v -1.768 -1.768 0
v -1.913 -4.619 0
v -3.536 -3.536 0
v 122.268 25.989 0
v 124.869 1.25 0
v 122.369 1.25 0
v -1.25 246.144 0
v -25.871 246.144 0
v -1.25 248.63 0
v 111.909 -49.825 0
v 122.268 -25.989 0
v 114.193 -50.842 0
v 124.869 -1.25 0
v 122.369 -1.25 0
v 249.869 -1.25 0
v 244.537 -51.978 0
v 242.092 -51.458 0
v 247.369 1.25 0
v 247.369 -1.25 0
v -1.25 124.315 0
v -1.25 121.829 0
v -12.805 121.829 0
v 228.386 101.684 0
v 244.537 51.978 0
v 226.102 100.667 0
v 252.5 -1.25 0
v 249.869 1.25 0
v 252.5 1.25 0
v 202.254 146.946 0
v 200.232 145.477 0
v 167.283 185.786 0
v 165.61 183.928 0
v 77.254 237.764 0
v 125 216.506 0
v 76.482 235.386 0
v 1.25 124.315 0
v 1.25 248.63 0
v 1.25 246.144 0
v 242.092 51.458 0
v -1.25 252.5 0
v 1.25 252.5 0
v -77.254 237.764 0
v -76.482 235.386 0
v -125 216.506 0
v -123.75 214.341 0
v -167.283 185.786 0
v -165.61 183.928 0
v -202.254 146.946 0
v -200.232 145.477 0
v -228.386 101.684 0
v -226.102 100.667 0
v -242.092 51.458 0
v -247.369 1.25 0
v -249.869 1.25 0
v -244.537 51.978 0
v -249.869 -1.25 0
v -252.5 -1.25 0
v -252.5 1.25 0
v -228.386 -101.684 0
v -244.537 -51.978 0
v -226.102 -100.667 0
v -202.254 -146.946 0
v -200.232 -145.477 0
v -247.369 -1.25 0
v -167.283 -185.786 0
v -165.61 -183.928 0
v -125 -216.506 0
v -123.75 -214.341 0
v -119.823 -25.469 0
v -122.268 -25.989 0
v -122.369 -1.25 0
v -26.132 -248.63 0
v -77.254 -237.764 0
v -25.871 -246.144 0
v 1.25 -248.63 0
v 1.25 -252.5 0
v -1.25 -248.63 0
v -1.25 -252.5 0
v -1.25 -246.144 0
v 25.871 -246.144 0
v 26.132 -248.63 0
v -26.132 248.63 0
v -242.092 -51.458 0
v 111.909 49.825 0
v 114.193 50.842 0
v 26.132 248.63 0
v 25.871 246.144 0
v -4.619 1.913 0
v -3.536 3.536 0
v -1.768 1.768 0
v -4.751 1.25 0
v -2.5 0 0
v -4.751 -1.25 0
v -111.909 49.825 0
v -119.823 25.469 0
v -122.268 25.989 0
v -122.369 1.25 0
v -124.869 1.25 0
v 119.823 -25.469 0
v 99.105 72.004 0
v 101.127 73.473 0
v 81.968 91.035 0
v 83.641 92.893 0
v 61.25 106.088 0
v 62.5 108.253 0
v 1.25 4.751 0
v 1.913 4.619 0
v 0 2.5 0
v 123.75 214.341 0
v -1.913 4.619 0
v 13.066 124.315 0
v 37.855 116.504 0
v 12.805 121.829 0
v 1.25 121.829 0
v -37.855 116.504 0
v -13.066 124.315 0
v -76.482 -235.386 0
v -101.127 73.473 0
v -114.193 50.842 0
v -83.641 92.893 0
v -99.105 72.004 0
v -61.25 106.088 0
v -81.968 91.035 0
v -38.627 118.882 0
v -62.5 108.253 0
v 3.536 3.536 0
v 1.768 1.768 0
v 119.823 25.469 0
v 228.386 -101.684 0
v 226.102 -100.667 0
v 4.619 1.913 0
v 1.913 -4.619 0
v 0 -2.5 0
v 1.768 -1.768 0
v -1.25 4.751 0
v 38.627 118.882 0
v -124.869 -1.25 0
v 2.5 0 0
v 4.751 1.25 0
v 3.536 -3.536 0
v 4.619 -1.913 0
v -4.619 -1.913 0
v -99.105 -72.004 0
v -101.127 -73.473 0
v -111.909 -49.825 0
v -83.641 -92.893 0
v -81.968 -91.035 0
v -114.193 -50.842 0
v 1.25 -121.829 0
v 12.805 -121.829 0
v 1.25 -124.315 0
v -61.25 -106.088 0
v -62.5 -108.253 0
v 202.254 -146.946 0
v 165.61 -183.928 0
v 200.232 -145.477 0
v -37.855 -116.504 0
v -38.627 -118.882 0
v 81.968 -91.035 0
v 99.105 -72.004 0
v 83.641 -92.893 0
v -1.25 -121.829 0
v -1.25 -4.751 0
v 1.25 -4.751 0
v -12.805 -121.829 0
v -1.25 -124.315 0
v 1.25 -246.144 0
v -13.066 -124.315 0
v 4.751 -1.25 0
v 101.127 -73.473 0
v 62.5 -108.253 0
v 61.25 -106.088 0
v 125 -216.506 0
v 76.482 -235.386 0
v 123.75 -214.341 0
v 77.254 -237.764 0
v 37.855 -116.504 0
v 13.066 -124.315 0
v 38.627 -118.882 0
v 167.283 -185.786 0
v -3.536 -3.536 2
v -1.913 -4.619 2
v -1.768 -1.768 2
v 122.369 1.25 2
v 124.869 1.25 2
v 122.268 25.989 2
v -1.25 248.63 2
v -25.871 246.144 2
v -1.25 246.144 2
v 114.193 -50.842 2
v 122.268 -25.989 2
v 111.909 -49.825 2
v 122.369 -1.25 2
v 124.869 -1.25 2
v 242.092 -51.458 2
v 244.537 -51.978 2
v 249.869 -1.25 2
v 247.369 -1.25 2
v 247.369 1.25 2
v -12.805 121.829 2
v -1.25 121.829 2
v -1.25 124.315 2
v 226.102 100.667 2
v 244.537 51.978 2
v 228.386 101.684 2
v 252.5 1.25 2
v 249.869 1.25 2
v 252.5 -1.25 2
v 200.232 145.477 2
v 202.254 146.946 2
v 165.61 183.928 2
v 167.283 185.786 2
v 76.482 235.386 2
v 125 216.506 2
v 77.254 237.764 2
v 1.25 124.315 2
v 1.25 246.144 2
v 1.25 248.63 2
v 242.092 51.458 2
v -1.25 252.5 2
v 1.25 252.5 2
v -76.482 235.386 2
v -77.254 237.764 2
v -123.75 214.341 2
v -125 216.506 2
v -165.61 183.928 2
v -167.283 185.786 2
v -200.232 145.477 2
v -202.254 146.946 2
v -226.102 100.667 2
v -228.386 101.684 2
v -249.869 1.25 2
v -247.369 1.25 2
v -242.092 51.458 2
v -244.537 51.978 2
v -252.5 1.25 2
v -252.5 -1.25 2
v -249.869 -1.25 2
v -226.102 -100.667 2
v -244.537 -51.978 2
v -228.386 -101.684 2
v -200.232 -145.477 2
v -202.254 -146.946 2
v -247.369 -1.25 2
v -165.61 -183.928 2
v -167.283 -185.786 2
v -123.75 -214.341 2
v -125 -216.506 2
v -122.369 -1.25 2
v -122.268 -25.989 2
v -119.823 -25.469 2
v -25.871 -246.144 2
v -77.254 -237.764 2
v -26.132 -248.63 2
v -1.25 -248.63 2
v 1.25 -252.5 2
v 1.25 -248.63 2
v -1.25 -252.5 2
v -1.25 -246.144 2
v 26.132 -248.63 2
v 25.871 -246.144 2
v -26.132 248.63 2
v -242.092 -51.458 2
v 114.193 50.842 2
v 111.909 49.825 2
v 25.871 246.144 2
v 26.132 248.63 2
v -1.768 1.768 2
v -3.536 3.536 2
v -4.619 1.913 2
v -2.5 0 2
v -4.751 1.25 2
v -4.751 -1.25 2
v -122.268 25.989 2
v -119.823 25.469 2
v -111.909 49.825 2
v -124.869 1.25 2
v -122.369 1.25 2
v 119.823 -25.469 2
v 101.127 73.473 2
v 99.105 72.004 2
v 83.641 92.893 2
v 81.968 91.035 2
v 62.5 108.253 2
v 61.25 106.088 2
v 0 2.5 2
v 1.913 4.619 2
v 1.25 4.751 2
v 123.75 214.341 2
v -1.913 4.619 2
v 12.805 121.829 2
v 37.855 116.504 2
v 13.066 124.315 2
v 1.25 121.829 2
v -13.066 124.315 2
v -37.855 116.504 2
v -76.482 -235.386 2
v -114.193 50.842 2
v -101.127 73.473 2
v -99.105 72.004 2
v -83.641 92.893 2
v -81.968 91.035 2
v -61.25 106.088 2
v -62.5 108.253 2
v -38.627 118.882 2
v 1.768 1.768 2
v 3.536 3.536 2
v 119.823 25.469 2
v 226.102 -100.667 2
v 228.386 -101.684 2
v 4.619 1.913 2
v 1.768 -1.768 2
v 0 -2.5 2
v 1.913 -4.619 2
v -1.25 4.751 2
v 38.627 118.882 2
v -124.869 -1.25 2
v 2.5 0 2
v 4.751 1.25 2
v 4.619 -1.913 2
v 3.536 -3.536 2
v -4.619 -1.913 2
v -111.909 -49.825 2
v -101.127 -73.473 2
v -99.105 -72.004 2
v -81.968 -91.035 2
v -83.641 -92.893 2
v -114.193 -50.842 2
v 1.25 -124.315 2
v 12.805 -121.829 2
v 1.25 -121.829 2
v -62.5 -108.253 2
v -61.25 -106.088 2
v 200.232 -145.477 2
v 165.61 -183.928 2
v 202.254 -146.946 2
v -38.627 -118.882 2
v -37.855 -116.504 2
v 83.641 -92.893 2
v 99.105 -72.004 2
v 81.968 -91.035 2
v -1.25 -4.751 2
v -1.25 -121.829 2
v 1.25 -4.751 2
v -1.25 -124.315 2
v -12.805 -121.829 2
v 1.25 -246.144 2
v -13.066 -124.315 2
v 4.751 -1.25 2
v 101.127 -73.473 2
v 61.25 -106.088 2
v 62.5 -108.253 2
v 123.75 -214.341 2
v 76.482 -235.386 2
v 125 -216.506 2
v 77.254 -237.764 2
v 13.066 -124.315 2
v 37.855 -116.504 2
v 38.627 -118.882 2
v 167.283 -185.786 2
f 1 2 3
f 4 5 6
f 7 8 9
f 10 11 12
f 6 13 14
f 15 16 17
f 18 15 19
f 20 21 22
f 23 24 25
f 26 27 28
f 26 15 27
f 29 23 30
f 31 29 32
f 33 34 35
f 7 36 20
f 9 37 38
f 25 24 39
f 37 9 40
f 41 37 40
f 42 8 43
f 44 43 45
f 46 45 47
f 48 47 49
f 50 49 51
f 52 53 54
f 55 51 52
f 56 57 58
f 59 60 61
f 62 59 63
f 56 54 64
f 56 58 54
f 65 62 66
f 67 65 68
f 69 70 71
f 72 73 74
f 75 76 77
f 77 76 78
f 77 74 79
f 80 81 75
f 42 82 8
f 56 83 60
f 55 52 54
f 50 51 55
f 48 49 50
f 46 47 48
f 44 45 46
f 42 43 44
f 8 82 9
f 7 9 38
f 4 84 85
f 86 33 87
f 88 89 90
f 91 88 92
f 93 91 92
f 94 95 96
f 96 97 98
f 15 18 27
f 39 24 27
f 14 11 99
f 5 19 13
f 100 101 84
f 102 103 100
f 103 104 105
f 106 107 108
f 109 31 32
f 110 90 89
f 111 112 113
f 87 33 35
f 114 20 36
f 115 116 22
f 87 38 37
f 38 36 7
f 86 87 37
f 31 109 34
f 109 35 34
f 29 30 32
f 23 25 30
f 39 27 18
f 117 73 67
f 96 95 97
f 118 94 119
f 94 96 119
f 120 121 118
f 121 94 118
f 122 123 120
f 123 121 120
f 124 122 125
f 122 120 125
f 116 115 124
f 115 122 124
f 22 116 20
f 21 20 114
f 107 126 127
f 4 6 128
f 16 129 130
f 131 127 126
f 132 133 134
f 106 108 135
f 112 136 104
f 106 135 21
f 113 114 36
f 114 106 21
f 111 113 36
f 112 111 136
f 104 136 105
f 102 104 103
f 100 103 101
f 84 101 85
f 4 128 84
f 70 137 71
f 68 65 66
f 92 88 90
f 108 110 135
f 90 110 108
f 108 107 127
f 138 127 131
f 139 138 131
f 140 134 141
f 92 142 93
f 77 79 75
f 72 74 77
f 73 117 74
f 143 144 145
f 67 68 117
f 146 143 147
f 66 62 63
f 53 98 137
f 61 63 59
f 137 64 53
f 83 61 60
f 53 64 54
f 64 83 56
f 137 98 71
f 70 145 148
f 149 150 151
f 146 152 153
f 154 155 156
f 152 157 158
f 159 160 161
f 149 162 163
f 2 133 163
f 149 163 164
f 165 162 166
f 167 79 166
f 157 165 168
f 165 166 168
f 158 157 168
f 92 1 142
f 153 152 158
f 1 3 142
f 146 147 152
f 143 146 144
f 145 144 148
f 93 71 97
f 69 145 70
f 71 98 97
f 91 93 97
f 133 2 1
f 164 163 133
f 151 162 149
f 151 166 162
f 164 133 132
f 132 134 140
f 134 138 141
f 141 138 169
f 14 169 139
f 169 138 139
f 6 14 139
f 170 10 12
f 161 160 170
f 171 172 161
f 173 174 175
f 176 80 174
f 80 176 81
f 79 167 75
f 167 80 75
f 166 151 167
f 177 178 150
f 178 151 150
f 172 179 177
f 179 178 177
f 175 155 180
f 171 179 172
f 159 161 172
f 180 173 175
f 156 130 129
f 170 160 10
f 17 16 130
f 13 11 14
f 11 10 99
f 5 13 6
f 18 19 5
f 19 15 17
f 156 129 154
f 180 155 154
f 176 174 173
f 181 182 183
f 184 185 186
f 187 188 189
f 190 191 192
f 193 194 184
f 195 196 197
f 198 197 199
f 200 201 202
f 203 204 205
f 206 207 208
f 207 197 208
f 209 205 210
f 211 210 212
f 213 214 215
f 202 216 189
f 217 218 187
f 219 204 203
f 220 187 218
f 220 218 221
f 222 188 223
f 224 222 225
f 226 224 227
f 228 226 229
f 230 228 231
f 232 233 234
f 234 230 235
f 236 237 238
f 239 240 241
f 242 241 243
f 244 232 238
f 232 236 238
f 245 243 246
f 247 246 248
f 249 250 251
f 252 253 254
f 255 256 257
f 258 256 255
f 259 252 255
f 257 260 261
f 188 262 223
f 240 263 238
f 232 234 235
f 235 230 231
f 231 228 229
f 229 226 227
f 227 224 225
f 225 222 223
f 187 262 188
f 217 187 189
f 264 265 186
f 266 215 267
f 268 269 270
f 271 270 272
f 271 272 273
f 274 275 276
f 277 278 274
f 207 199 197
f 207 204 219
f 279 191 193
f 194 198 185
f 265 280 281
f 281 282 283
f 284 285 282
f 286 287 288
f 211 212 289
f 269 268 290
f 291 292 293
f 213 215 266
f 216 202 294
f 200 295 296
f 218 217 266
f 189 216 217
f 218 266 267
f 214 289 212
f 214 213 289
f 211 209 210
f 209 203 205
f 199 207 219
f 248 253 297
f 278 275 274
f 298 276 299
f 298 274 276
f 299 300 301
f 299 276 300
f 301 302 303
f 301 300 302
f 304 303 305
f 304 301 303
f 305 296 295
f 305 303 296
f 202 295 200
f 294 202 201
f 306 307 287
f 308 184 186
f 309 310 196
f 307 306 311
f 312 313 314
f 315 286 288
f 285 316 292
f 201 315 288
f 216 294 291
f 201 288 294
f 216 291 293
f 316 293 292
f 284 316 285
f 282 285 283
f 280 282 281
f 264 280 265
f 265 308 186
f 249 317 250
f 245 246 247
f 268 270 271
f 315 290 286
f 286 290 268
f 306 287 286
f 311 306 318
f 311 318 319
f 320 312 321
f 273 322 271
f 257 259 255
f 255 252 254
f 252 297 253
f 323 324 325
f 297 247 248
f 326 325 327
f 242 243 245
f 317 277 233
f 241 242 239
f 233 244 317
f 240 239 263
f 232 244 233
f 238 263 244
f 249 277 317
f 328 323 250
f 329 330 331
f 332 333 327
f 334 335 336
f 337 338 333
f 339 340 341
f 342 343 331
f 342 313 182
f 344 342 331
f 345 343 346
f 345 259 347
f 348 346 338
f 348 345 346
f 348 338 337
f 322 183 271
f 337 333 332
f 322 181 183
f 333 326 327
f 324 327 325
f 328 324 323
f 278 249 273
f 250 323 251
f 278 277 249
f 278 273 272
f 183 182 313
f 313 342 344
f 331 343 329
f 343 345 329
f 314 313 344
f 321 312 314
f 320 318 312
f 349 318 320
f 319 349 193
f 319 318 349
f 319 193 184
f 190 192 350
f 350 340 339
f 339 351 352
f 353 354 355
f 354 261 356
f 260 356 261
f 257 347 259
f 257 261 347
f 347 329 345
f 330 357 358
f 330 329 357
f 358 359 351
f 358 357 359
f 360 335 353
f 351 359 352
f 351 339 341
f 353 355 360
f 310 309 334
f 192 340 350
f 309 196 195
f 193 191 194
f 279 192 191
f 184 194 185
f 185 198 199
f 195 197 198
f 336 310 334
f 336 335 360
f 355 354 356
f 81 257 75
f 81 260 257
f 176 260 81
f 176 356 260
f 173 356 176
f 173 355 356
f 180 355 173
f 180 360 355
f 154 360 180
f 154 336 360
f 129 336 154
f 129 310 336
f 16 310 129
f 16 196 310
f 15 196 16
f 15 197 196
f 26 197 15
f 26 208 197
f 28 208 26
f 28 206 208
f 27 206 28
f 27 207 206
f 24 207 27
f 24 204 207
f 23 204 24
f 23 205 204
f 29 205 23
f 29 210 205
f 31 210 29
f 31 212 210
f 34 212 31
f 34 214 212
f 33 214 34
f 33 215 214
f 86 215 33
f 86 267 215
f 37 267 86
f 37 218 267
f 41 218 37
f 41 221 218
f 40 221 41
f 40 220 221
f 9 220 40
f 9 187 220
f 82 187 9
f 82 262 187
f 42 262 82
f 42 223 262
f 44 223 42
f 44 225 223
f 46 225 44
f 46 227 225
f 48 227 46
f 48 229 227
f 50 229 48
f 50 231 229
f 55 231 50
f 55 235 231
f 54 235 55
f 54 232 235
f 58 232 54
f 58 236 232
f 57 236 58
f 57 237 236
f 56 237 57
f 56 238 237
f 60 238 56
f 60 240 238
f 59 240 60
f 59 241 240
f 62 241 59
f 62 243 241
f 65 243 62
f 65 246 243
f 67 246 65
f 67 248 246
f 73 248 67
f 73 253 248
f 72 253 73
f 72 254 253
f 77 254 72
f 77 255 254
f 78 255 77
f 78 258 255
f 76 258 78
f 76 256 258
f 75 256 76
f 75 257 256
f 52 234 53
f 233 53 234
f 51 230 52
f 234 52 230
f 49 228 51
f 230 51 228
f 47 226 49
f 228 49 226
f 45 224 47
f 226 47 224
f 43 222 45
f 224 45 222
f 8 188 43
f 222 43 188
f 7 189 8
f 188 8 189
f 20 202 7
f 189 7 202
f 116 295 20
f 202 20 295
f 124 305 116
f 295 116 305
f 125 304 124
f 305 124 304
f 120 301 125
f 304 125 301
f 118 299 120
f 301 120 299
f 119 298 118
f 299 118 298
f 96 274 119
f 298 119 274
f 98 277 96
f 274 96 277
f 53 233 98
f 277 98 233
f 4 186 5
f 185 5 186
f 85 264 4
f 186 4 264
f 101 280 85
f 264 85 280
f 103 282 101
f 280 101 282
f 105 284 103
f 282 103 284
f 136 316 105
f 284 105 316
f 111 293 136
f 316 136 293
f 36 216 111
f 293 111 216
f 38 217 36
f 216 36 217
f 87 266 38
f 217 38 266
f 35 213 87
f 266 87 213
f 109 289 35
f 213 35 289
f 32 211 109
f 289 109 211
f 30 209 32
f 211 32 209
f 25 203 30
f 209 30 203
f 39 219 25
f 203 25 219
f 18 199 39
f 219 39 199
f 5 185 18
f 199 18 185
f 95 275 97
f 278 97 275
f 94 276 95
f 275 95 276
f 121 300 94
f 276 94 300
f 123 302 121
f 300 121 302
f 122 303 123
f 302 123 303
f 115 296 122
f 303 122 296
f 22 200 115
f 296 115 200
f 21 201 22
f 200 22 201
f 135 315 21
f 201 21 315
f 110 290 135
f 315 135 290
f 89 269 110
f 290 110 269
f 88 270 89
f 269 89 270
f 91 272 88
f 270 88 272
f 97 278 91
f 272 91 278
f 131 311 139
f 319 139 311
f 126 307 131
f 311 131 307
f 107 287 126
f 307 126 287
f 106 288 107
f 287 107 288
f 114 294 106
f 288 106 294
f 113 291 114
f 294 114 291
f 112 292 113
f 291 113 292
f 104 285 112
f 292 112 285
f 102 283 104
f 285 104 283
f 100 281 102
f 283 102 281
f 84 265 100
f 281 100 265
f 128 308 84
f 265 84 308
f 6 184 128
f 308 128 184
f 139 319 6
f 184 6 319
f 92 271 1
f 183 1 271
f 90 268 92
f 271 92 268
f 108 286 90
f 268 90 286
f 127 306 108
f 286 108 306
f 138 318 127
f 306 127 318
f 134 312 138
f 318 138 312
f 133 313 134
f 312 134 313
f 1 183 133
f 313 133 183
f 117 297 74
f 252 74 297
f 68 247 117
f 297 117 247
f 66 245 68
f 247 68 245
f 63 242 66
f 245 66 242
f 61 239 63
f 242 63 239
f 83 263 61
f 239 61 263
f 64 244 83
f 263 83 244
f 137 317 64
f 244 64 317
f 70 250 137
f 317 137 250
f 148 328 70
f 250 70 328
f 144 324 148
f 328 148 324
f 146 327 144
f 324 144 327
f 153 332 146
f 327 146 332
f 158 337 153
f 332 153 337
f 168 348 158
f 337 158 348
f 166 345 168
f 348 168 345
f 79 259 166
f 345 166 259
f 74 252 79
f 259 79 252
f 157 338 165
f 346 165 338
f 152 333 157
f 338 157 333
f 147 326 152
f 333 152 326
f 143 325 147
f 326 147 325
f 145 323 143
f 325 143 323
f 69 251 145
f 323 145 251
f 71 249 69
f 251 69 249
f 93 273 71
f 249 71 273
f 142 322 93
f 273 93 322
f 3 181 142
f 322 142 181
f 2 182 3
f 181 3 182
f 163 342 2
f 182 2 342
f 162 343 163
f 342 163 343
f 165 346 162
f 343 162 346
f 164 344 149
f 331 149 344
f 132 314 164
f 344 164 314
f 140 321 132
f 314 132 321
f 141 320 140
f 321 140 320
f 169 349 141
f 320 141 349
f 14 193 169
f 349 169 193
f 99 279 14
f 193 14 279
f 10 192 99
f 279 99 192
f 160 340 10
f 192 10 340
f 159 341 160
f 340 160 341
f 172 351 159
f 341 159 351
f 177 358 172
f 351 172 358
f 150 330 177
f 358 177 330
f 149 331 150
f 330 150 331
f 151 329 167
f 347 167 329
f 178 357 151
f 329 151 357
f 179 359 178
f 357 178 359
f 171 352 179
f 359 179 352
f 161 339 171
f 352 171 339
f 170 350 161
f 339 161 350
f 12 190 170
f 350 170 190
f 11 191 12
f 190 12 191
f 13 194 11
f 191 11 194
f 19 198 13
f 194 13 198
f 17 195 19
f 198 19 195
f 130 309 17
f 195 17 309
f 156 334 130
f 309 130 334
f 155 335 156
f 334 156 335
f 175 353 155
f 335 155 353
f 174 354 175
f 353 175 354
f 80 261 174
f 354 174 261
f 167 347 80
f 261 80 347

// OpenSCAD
dia = 2.5;
r1 = 250;
r2 = 125;
lin = 2*r1 + 2*dia;

linear_extrude  (height=2)
difference() 
{   
    outer();
    circle(r=dia);
}

module outer() 
    {
        difference() {
            circle(r=r1);
            circle(r=r1 - dia);
        }
        difference() {
            circle(r=r2);
            circle(r=r2 - dia);
        }
        square([dia, lin], center=true);
        square([lin, dia], center=true);
        circle(r= 2*dia);
    };
